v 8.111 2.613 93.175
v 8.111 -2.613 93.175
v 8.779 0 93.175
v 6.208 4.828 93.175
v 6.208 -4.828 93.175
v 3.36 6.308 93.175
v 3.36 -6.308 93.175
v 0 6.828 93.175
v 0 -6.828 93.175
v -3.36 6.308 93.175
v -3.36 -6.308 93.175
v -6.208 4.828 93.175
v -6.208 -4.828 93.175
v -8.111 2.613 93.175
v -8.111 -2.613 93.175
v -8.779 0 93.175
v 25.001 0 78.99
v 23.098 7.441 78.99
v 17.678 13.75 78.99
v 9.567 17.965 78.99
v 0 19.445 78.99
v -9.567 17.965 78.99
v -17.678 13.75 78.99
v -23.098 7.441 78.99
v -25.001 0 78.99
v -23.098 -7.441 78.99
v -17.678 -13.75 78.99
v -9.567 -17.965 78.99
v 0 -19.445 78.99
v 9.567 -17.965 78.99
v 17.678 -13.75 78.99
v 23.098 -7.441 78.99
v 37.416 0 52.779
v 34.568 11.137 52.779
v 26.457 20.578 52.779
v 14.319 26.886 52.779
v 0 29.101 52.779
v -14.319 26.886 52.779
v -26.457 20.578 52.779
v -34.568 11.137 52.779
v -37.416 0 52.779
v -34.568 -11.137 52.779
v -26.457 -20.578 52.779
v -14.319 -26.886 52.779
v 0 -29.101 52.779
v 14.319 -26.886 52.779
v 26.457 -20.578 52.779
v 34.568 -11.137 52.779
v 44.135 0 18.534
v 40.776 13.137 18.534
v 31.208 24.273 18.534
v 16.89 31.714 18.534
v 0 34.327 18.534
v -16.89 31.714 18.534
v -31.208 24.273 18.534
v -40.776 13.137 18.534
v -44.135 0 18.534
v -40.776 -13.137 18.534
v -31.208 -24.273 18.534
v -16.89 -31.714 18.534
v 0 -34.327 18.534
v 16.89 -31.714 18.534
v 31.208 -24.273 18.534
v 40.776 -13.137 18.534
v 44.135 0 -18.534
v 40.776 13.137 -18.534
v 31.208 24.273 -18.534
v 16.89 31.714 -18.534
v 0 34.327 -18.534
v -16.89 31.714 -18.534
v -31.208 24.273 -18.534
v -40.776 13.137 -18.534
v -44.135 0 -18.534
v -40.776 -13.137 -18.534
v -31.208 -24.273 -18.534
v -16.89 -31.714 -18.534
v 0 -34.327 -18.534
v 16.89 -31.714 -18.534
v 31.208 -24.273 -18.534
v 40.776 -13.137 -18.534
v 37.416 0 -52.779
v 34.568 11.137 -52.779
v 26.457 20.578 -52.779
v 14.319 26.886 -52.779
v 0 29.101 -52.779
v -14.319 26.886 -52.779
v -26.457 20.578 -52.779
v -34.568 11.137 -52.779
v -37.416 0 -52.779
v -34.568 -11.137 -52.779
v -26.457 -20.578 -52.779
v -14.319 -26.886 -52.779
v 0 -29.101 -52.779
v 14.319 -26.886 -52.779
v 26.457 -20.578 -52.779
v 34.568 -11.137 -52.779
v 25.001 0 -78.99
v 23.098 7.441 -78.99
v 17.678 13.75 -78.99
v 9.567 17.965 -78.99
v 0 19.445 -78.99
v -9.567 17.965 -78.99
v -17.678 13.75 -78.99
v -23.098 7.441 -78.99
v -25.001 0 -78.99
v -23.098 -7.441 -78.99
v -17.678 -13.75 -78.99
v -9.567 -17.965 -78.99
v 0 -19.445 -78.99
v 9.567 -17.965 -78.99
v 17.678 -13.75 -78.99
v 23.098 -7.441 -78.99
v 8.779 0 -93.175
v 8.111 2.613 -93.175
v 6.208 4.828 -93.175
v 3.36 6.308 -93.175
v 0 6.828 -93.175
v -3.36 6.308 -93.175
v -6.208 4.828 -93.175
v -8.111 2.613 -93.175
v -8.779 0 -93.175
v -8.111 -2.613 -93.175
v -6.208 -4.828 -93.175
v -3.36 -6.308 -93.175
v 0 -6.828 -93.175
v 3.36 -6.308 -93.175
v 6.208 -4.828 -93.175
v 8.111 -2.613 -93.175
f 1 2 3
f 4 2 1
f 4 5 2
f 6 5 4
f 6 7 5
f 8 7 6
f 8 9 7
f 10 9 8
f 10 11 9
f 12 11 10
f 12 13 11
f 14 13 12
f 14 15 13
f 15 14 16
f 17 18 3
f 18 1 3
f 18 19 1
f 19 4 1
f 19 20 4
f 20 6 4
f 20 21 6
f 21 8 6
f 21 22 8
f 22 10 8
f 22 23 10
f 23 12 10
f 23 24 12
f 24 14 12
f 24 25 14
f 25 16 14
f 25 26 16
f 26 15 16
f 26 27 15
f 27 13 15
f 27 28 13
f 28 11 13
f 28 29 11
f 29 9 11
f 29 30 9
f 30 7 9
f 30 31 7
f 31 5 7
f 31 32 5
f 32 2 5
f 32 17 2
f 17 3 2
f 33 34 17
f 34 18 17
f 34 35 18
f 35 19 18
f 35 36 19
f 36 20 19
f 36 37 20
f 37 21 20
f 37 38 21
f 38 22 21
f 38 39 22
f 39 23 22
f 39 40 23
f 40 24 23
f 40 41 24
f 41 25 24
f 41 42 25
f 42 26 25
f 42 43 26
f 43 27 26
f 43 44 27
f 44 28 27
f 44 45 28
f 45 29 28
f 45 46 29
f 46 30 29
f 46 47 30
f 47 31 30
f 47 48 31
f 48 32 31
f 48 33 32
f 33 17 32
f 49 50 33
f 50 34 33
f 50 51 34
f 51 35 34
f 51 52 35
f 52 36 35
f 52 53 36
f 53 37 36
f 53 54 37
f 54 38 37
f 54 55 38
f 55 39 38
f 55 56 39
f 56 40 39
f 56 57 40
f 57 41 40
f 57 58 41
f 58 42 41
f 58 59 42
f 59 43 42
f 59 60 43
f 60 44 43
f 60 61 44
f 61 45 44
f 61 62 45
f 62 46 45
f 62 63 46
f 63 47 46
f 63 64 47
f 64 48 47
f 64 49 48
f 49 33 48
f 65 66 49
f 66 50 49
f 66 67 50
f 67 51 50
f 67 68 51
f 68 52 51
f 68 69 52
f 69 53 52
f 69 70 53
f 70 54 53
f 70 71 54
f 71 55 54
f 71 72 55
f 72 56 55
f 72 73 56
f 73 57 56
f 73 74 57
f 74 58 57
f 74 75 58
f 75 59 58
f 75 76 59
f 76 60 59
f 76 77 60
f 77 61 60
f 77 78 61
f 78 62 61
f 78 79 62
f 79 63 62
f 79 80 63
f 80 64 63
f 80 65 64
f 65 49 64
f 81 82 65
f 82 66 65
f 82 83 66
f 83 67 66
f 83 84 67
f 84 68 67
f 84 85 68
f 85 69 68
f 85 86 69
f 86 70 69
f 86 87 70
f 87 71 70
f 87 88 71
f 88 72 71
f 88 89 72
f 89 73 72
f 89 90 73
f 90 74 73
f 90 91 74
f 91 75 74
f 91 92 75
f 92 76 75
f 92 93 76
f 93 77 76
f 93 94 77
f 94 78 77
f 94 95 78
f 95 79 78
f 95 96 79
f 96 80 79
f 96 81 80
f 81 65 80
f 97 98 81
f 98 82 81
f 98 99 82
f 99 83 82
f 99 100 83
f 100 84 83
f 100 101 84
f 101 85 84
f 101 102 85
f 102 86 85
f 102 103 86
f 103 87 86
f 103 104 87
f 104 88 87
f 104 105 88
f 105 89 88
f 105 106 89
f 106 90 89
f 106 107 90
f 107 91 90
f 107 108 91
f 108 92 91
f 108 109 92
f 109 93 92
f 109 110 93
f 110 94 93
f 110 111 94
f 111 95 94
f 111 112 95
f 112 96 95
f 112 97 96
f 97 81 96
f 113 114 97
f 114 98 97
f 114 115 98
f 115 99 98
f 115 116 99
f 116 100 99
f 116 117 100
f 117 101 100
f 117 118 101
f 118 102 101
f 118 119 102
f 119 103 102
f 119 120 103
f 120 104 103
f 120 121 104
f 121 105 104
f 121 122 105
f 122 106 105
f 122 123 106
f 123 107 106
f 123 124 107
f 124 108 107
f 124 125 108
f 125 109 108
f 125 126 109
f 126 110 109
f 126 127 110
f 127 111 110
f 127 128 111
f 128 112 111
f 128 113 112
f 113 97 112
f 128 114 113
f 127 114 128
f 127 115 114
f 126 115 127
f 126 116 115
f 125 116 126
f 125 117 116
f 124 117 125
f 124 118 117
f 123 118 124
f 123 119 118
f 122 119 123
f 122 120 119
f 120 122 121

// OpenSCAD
// Generated by SolidPython 1.0.1 on 2020-07-29 00:46:48


scale(v = [9, 7, 19]) {
	sphere(r = 5);
}
/***********************************************
*********      SolidPython code:      **********
************************************************
 
# import packages: SolidPython
from solid import *
from solid.utils import *
from itertools import chain, combinations, permutations


class Resize:

    def __init__(self, scad_file):
        self.scad_file = scad_file
        #self.scad_file = import_scad(scad_file)
        # cone/cylinder param:
        self.r1 = 0
        self.r2 = 0
        self.h = 0
        # rectangular prism param:
        self.w = 0
        self.l = 0
        # ellipse param:
        self.r = 0

    # import OpenScad code (file name corresponds to shape)


    # classify shape + parameters
    def assign(self, param1, param2, param3):
        if self.scad_file == 'cone.scad':
            self.r1 = param1
            self.r2 = param2
            self.h = param3
        elif self.scad_file == 'cylinder.scad':
            self.r1 = param1
            self.r2 = param2
            self.h = param3
        elif self.scad_file == 'rectangularPrism.scad':
            self.h = param1
            self.l = param2
            self.w = param3
        else:
            self.r = param1
            self.h = param2

    # resize parameters
    def iterate(self):
        x = range(3, 20, 2)
        i = 1
        if self.scad_file == 'cone.scad':
            tempList = list(permutations(x, 2))
            for temp in tempList:
                param1 = temp[0]
                param2 = temp[1]
                filepath = 'produced_scad_files/' + 'cone' + str(param1) + '_' + str(param2) + '_' + '.scad'
                scad_render_to_file(cylinder(h=param1, r1=param2, r2=0), filepath)

        elif self.scad_file == 'cylinder.scad':
            tempList = list(permutations(x, 3))
            for temp in tempList:
                param1 = temp[0]
                param2 = temp[1]
                filepath = 'produced_scad_files/' + 'cylinder' + str(param1) + '_' + str(param2) + '_' + '.scad'
                scad_render_to_file(cylinder(h=param1, r1=param2, r2=param2), filepath)

        elif self.scad_file == 'rectangularPrism.scad':
            tempList = list(permutations(x, 3))
            for temp in tempList:
                param1 = temp[0]
                param2 = temp[1]
                param3 = temp[2]
                filepath = 'produced_scad_files/' + 'rectangularPrism' + str(param1) + '_' + str(param2) + '_' + str(
                    param3) + '.scad'
                scad_render_to_file(cube(size=(param1, param2, param3)), filepath)

        elif self.scad_file == 'ellipse.scad':
            tempList = list(permutations(x, 4))
            for temp in tempList:
                param1 = temp[0]
                param2 = temp[1]
                param3 = temp[2]
                param4 = temp[3]
                filepath = 'produced_scad_files/' + 'ellipse' + str(param1) + '_' + str(param2) + '_' + str(param3) + '_' + str(param4) + '.scad'
                scad_render_to_file(scale([param1, param2, param3])(sphere(r=param4)), filepath)

    def render_to_scadfile(self):
        scad_render_to_file(scad, 'example.scad') 
 
************************************************/
